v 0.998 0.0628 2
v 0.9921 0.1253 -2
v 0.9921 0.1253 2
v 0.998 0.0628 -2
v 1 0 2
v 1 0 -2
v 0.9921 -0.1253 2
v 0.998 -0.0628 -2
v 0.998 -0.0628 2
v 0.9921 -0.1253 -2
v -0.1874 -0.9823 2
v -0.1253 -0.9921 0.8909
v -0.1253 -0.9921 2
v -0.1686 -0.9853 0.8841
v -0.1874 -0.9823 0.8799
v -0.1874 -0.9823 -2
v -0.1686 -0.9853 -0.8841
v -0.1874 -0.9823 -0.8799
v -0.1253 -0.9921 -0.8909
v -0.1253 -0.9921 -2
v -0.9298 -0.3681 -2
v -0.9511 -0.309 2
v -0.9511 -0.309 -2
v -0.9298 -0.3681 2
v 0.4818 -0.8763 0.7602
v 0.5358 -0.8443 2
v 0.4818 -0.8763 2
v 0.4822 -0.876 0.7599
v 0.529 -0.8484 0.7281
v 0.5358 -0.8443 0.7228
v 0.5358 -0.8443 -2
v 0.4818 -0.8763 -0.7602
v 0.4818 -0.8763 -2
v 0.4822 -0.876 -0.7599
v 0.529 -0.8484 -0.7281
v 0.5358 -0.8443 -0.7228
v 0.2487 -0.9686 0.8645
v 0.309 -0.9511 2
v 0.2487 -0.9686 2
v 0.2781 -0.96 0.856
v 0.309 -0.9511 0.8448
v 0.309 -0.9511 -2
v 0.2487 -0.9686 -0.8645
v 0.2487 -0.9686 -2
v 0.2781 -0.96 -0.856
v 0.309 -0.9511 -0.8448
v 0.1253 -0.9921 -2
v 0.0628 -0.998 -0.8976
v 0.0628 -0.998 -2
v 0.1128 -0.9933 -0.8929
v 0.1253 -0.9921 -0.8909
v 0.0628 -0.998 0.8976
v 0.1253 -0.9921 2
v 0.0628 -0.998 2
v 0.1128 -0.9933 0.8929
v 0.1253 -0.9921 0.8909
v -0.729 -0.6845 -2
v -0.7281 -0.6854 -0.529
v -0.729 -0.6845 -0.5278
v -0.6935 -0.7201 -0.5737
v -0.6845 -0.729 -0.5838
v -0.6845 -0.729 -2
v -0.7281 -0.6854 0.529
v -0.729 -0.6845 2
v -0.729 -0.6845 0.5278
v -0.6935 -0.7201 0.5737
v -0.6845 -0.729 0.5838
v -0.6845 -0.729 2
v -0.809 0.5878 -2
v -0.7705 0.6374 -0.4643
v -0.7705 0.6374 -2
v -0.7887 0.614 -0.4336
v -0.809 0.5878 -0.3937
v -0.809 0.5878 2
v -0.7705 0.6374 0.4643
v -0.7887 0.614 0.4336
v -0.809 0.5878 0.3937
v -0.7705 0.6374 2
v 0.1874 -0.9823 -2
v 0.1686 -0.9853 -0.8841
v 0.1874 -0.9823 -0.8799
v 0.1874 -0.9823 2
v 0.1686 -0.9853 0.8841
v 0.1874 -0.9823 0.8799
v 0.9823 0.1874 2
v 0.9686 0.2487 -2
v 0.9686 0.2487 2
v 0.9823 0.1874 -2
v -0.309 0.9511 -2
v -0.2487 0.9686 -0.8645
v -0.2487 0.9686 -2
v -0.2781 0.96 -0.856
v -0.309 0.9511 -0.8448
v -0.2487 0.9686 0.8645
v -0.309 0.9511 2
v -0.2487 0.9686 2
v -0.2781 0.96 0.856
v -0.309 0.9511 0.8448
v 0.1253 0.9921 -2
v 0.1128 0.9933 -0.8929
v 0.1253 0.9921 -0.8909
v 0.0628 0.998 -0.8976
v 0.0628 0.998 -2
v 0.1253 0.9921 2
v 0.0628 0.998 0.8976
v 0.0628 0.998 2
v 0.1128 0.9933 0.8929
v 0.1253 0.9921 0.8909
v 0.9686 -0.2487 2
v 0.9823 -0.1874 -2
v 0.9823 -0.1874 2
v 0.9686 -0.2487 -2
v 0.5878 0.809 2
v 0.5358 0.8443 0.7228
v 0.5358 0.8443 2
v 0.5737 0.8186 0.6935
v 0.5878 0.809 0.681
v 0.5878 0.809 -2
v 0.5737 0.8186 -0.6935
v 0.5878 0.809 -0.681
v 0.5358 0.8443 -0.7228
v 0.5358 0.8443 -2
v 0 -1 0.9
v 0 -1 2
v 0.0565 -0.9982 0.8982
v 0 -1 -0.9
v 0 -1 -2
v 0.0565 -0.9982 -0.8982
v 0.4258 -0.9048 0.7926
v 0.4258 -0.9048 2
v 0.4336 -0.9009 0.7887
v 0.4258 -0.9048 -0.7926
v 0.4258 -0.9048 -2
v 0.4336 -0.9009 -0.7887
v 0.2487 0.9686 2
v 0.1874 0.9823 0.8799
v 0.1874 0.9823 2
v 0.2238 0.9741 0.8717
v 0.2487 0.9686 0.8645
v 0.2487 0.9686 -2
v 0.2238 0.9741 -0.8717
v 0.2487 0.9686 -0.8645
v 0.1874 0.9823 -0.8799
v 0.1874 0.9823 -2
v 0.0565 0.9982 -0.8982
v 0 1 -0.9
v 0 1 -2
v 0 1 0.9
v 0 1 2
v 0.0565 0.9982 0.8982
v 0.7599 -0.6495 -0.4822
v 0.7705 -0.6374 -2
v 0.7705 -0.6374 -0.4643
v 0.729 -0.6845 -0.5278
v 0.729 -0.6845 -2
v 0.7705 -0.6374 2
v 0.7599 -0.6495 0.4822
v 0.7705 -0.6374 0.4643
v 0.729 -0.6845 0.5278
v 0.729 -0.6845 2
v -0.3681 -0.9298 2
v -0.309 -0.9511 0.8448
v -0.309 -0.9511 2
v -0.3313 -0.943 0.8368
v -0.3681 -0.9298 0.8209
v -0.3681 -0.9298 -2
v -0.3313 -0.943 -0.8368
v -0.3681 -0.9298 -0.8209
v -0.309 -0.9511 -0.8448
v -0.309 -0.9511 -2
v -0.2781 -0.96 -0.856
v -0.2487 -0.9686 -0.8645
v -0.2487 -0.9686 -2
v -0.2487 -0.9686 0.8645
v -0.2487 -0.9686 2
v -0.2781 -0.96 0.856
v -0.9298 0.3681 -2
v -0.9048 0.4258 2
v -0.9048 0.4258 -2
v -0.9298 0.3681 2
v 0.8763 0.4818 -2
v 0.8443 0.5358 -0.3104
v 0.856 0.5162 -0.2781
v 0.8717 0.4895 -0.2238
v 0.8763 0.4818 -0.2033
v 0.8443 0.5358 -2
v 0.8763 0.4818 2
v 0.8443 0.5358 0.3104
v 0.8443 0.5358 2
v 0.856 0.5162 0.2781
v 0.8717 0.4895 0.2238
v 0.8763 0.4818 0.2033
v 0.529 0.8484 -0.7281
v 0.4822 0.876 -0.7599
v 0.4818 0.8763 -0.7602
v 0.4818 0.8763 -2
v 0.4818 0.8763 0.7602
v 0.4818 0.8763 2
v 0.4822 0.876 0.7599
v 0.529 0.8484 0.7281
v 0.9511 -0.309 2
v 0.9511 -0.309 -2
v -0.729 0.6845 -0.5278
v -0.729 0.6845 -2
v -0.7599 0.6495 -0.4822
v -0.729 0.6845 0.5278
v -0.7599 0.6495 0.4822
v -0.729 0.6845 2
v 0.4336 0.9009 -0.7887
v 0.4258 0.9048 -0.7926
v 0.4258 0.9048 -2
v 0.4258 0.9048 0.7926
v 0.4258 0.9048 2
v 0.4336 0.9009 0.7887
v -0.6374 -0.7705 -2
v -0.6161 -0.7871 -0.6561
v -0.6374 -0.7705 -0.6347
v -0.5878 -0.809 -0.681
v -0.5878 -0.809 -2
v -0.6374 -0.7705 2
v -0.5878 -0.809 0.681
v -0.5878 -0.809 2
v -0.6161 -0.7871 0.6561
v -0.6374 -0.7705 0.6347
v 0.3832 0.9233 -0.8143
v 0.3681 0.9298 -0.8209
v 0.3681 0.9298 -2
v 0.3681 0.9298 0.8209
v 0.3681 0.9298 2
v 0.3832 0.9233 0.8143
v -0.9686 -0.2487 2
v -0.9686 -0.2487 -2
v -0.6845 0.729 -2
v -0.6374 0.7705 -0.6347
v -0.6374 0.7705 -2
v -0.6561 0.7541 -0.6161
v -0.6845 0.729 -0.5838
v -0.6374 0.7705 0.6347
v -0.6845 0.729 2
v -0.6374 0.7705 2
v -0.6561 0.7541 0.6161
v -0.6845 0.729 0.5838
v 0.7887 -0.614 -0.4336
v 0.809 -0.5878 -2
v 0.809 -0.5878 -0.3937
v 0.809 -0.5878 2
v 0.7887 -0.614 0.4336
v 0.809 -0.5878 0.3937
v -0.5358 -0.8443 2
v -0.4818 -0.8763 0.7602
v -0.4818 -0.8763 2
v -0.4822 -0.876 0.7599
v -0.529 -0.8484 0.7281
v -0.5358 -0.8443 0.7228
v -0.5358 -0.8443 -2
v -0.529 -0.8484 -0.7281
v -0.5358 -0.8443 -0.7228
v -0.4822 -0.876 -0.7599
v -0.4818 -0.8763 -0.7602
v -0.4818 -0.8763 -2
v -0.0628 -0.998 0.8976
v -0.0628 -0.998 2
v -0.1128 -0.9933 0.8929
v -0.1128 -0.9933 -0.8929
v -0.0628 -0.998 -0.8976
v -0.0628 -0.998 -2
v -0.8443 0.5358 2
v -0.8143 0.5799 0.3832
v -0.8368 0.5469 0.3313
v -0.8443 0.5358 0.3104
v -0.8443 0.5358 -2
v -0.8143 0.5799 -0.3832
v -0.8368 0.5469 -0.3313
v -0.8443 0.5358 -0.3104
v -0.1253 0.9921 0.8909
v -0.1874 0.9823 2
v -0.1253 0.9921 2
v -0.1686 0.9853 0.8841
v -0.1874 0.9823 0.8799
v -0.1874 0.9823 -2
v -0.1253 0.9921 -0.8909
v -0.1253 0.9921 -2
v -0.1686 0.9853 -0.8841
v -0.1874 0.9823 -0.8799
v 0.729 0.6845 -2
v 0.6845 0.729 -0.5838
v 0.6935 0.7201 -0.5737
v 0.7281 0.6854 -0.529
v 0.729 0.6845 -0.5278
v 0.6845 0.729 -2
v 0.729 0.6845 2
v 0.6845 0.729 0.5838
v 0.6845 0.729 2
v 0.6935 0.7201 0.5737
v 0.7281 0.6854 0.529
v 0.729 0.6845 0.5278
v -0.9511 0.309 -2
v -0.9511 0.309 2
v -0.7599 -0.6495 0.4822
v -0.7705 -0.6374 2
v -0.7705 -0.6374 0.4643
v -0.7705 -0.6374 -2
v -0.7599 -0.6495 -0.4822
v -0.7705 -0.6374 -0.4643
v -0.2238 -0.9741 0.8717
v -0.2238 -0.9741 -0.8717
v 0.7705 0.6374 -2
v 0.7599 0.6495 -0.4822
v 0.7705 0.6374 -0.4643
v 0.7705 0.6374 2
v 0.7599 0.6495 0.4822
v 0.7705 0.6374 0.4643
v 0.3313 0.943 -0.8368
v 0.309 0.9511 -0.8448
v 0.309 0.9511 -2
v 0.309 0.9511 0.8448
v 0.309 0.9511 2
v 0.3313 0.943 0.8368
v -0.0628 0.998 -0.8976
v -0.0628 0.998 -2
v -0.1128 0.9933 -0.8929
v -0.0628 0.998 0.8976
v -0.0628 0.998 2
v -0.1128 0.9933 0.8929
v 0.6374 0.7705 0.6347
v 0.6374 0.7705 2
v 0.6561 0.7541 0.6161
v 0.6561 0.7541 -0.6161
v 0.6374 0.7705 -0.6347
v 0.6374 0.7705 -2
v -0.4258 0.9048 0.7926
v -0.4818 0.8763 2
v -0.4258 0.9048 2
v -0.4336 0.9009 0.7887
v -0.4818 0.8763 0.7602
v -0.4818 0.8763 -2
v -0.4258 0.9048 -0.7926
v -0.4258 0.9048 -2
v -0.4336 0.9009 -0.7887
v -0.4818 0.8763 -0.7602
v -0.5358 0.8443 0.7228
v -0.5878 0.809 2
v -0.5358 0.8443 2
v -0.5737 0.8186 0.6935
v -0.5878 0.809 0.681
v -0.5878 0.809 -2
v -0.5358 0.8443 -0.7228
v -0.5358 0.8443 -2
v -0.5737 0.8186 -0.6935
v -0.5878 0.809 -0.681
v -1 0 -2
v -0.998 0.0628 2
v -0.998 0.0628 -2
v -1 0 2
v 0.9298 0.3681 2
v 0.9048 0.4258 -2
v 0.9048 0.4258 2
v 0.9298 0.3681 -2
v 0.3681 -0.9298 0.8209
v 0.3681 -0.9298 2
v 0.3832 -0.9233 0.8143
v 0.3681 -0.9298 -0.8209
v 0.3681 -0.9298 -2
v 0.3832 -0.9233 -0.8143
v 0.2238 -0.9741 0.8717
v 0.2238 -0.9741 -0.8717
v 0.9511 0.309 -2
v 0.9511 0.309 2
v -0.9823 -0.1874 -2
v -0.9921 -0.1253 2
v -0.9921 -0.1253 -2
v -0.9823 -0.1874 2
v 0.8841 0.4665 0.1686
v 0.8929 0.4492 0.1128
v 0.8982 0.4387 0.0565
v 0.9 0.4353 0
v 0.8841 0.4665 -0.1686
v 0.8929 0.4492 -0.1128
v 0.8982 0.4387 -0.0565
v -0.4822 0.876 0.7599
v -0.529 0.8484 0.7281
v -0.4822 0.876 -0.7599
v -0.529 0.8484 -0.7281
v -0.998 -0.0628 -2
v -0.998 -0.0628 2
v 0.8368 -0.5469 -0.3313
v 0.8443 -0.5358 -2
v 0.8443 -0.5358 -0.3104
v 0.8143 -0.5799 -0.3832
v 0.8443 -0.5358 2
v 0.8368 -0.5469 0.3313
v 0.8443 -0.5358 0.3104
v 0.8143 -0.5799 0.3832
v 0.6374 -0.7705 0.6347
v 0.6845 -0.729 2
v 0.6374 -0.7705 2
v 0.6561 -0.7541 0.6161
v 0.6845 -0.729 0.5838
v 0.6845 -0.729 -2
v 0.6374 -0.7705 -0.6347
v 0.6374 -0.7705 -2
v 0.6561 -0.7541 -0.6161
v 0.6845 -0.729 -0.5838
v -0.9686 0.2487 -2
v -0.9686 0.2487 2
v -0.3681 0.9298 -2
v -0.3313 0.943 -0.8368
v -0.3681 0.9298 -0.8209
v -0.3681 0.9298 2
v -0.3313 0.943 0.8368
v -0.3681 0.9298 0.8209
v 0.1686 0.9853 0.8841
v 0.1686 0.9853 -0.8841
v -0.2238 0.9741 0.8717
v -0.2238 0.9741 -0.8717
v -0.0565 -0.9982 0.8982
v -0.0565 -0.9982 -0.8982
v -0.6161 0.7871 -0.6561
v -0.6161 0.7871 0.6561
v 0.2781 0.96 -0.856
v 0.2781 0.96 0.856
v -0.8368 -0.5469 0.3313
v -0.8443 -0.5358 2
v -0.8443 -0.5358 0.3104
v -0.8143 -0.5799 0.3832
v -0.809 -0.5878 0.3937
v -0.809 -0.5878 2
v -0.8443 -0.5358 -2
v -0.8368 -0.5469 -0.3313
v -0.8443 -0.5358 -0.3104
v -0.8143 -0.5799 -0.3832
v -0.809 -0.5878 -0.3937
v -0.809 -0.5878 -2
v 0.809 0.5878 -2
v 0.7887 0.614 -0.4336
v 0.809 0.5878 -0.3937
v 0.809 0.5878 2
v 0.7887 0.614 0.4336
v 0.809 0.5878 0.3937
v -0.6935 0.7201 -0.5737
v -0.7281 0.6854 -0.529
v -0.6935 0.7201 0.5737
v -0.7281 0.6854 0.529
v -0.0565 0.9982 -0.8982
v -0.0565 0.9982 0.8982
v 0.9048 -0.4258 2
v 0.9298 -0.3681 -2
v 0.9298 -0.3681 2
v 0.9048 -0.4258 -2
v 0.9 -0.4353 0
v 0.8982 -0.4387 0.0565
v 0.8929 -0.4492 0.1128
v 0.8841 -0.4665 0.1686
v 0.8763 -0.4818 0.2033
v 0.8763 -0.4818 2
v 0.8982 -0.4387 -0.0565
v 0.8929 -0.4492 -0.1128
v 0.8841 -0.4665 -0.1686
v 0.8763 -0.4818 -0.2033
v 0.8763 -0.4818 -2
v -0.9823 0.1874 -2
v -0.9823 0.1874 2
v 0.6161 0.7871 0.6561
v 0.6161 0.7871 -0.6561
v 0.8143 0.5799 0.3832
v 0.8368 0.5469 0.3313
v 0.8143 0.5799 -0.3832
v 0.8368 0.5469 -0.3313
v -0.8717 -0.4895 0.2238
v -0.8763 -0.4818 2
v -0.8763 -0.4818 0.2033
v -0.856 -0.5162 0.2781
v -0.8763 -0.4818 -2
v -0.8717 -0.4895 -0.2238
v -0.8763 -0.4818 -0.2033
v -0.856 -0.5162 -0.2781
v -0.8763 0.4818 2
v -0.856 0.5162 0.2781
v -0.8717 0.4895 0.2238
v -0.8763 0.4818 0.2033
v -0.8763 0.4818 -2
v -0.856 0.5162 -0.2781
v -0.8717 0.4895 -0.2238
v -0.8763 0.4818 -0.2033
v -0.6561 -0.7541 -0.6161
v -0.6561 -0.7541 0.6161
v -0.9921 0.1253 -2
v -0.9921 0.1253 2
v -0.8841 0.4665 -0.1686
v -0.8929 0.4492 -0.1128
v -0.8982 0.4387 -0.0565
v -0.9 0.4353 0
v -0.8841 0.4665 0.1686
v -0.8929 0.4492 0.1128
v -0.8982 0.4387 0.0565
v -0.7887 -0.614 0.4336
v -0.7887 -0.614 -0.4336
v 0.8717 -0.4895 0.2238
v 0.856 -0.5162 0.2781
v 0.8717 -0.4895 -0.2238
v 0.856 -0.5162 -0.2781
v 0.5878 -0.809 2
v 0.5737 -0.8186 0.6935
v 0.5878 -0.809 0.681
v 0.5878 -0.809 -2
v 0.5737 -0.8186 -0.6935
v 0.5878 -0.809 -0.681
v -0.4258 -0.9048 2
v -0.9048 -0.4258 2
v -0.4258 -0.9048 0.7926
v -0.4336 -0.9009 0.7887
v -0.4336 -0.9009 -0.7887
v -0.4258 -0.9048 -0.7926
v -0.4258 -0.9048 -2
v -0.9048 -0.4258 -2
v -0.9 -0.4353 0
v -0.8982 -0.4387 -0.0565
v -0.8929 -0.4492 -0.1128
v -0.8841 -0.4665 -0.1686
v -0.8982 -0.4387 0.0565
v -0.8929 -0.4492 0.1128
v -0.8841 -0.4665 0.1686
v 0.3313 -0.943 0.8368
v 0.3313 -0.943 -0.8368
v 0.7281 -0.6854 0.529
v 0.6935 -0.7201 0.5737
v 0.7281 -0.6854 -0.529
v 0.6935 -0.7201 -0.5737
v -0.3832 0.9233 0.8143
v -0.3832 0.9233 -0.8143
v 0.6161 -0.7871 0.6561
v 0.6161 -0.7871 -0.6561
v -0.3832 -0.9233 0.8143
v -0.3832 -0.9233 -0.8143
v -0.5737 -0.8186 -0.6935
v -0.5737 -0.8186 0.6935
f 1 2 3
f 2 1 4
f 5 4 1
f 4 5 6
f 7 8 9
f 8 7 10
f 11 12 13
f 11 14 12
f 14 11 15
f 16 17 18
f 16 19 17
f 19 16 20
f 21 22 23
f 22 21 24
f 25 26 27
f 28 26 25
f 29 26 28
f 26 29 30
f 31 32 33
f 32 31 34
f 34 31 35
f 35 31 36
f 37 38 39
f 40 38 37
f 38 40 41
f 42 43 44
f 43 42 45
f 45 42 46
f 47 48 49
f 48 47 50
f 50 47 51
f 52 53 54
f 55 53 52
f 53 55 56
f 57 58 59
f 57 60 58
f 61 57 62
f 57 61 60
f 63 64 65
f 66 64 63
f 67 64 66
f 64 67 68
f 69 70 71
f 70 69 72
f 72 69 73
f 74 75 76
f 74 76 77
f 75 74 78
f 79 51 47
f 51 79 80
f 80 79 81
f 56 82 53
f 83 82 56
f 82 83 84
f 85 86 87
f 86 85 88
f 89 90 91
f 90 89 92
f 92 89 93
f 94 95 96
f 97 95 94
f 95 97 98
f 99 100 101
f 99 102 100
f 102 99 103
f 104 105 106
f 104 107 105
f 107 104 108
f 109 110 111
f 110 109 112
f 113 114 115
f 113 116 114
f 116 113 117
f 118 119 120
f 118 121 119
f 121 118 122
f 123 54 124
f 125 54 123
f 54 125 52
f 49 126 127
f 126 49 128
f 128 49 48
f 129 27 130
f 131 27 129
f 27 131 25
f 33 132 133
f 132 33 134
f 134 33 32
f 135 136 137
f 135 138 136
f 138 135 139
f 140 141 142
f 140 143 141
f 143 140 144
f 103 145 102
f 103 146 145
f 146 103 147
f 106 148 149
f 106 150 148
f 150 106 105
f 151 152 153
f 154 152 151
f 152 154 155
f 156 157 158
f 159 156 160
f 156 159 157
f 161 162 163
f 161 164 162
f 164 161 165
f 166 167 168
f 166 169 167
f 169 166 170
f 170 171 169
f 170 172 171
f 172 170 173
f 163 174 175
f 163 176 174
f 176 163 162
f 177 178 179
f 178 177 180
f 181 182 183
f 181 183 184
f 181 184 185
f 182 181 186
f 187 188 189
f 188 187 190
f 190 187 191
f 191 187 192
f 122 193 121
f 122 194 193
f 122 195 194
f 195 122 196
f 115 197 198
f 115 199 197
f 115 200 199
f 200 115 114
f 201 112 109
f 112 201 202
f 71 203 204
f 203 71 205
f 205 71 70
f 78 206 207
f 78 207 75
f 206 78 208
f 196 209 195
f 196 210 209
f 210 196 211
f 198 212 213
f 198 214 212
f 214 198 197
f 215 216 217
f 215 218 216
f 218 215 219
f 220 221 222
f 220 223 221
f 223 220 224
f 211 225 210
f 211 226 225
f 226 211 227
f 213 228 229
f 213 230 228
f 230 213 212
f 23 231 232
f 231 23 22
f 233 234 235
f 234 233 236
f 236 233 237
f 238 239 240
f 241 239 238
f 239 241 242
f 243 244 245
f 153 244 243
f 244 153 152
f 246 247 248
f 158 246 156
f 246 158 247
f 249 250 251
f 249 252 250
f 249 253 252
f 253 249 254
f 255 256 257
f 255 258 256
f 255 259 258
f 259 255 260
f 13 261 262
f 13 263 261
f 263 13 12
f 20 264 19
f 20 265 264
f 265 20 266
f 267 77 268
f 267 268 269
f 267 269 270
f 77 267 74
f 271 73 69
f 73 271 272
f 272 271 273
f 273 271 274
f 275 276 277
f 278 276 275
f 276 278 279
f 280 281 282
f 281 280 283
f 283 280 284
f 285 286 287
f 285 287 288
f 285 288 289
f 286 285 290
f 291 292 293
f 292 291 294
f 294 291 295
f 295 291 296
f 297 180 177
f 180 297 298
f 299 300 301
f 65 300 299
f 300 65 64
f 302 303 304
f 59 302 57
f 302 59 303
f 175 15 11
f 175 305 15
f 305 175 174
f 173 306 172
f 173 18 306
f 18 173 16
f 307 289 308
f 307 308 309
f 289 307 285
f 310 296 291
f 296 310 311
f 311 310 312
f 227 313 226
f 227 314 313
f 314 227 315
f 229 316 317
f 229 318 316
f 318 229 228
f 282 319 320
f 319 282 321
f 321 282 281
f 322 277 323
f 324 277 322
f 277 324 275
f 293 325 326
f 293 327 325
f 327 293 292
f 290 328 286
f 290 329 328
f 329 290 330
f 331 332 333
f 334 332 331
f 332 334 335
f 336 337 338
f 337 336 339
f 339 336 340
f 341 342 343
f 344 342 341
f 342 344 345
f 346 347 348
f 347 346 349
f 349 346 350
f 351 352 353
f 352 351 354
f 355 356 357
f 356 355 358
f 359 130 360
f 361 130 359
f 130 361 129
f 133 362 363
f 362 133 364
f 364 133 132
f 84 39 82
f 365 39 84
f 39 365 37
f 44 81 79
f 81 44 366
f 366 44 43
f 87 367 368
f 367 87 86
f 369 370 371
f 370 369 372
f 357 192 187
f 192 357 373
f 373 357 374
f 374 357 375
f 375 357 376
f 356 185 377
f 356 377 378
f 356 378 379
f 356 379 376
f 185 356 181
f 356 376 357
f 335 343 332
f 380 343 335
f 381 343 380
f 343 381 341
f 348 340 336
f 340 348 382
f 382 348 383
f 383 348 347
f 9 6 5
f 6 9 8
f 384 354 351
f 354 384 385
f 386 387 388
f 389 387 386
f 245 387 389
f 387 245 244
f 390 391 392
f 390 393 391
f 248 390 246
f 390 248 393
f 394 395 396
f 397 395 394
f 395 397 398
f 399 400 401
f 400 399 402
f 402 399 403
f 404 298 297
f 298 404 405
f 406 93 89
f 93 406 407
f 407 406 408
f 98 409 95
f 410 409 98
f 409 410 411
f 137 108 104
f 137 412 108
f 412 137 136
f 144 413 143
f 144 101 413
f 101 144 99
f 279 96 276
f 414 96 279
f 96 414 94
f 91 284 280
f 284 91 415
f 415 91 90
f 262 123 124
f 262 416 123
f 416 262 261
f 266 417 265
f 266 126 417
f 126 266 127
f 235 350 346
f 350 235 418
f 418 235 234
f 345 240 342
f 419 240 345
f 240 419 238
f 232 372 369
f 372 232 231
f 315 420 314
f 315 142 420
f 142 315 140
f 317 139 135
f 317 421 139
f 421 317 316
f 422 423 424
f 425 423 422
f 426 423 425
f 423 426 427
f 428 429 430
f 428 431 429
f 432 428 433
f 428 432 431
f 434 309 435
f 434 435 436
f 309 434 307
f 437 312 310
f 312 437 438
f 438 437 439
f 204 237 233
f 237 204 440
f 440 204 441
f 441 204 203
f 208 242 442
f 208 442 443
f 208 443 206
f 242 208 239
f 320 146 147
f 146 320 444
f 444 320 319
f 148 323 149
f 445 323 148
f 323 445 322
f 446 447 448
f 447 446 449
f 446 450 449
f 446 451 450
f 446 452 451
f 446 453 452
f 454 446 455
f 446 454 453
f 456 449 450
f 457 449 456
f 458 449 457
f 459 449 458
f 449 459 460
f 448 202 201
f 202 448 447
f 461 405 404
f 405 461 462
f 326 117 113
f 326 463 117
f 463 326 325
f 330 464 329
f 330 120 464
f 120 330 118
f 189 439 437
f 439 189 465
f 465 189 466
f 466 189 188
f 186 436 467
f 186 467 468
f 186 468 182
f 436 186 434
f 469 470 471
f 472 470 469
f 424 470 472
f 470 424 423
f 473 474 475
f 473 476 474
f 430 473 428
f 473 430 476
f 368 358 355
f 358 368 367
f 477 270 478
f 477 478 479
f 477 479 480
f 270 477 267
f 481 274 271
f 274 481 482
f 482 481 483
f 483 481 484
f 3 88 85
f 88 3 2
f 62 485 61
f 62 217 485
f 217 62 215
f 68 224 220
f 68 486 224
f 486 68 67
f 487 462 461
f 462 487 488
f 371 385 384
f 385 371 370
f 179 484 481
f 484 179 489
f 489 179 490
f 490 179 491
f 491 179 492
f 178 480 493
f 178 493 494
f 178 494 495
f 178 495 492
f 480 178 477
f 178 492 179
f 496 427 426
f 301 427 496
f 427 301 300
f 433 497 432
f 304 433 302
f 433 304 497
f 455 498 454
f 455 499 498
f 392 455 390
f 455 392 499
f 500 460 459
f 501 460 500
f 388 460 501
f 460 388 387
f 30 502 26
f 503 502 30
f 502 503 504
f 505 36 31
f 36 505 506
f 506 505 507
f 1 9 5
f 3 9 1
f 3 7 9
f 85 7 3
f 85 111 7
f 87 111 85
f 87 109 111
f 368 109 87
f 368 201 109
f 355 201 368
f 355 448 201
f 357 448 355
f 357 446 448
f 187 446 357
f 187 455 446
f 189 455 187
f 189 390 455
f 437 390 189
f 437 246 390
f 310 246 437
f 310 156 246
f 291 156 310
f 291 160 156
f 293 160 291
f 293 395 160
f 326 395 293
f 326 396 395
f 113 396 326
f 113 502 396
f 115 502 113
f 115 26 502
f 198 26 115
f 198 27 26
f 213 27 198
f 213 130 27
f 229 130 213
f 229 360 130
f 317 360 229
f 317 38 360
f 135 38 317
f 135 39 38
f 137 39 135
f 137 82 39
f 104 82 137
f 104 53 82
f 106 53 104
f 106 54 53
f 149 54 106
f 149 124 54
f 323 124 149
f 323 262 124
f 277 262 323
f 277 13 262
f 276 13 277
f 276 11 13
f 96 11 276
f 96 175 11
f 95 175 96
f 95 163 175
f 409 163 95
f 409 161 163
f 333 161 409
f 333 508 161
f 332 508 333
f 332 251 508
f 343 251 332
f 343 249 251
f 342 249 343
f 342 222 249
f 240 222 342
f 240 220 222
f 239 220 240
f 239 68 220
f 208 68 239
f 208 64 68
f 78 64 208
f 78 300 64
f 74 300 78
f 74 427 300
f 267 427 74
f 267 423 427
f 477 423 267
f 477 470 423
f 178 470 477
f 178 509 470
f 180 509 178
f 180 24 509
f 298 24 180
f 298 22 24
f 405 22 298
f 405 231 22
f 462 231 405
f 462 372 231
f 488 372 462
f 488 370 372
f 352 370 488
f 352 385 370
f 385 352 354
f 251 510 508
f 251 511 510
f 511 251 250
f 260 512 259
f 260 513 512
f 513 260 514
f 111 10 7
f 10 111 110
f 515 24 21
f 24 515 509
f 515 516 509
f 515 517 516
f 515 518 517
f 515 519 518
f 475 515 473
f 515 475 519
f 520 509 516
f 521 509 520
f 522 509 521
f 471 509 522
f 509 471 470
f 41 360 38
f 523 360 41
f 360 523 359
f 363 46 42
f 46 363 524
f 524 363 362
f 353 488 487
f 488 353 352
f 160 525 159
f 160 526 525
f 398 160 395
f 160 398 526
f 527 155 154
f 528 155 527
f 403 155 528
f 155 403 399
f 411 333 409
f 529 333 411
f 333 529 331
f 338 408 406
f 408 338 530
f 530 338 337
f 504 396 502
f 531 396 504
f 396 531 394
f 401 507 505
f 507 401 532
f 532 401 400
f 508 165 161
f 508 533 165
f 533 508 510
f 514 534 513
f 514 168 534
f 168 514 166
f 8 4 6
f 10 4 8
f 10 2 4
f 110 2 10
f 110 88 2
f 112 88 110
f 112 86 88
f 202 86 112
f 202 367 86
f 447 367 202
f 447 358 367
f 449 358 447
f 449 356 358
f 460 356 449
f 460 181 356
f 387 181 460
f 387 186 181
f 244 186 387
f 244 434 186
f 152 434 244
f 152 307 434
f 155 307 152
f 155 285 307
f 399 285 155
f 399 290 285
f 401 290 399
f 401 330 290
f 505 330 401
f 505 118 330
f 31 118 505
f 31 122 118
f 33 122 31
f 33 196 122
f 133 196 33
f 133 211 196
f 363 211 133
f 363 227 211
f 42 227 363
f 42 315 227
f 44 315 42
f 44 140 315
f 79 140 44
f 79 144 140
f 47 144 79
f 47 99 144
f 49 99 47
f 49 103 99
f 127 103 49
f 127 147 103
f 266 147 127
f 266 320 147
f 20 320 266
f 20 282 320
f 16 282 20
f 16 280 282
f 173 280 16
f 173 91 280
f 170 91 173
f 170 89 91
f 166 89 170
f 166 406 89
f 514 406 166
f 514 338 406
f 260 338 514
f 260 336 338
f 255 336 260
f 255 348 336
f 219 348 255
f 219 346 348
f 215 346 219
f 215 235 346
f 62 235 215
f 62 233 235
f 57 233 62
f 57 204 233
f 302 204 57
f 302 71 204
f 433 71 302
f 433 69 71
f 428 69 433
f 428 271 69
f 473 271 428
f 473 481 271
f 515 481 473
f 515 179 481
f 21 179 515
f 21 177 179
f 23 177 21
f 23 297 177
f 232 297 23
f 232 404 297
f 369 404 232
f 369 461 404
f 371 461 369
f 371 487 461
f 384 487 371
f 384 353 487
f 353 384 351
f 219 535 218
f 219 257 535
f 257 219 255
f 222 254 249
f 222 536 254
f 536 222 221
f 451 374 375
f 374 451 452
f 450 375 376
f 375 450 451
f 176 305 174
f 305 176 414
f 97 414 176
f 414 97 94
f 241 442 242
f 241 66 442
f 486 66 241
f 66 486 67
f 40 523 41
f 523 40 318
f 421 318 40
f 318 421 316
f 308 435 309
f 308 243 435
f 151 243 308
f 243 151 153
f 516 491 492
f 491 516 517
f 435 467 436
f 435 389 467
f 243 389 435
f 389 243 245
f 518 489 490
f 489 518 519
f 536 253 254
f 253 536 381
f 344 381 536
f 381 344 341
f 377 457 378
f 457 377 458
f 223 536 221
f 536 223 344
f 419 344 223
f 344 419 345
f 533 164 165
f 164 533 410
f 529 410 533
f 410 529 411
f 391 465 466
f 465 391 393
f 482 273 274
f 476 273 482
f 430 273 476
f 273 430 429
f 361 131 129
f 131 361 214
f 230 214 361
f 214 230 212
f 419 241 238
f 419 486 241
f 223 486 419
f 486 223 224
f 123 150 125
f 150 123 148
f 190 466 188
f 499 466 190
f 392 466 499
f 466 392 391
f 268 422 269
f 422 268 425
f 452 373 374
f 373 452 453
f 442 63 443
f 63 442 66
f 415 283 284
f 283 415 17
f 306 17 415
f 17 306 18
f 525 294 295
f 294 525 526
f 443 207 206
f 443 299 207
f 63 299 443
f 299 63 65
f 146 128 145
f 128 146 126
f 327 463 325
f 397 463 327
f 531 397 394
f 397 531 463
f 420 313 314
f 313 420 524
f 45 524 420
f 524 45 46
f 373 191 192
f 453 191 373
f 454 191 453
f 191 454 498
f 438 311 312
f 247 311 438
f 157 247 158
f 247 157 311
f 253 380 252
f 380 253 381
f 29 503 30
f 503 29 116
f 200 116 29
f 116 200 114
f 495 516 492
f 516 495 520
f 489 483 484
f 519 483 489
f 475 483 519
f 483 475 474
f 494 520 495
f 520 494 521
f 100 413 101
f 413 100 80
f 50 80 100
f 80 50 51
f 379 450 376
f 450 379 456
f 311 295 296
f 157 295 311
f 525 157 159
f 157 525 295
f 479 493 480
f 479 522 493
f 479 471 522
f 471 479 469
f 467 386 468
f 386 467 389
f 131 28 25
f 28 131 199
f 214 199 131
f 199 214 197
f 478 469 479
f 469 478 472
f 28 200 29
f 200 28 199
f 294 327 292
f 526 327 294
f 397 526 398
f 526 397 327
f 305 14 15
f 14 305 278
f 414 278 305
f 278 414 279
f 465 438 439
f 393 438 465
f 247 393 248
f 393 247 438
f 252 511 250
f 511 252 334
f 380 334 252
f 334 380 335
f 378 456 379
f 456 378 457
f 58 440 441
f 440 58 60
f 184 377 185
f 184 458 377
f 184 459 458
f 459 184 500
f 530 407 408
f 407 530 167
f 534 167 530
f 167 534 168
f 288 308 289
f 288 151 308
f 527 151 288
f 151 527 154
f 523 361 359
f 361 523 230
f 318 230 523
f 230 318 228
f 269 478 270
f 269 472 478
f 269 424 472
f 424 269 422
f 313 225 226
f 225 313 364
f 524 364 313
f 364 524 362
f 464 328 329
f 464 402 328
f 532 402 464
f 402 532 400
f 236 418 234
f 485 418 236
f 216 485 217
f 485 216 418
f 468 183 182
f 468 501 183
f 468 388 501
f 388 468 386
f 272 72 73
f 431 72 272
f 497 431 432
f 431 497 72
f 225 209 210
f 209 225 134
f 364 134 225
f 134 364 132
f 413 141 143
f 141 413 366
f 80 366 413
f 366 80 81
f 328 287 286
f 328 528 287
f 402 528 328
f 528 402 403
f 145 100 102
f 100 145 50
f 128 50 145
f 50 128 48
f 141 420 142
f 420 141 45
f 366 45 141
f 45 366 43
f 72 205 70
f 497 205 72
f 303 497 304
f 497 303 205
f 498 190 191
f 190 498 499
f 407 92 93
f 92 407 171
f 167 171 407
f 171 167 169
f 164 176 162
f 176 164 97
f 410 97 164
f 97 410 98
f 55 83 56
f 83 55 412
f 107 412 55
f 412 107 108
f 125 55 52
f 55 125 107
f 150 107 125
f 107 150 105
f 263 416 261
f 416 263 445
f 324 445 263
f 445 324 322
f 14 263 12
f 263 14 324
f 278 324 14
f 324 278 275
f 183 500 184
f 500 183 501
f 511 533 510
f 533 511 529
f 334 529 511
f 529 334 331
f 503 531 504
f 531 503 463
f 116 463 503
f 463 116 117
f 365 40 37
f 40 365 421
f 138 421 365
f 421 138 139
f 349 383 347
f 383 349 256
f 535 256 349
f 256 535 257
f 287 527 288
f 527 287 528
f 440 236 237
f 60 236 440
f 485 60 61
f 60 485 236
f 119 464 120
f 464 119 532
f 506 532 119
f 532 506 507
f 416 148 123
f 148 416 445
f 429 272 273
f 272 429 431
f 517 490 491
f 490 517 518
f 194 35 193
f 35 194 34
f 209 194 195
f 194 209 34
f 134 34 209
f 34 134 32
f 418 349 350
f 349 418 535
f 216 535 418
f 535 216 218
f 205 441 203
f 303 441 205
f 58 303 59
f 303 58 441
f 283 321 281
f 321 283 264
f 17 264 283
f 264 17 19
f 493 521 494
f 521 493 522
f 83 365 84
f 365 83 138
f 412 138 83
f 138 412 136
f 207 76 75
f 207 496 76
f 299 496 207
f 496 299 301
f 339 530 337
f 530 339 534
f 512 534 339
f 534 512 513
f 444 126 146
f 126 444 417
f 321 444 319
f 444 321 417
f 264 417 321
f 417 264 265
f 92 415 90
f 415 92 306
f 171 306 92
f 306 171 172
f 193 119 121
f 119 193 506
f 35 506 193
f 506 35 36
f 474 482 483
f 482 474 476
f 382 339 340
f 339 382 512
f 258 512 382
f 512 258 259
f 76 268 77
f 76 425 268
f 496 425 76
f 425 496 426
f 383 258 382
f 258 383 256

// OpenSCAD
*%sphere(20);

$fn = 50;

*#translate([10, 0, 0]) sphere(20);

*translate([20,0,-20]) rotate(a=90, v=[1,1,0]) cylinder(r1=5,r2=2,h=20);

*union() {
 	cylinder (h = 4, r=1, center = true, $fn=100);
 	rotate ([90,0,0]) cylinder (h = 4, r=0.9, center = true, $fn=100);
 }

 difference() {
	cylinder (h = 4, r=1, center = true, $fn=100);
	rotate ([90,0,0]) cylinder (h = 4, r=0.9, center = true, $fn=100);
}
